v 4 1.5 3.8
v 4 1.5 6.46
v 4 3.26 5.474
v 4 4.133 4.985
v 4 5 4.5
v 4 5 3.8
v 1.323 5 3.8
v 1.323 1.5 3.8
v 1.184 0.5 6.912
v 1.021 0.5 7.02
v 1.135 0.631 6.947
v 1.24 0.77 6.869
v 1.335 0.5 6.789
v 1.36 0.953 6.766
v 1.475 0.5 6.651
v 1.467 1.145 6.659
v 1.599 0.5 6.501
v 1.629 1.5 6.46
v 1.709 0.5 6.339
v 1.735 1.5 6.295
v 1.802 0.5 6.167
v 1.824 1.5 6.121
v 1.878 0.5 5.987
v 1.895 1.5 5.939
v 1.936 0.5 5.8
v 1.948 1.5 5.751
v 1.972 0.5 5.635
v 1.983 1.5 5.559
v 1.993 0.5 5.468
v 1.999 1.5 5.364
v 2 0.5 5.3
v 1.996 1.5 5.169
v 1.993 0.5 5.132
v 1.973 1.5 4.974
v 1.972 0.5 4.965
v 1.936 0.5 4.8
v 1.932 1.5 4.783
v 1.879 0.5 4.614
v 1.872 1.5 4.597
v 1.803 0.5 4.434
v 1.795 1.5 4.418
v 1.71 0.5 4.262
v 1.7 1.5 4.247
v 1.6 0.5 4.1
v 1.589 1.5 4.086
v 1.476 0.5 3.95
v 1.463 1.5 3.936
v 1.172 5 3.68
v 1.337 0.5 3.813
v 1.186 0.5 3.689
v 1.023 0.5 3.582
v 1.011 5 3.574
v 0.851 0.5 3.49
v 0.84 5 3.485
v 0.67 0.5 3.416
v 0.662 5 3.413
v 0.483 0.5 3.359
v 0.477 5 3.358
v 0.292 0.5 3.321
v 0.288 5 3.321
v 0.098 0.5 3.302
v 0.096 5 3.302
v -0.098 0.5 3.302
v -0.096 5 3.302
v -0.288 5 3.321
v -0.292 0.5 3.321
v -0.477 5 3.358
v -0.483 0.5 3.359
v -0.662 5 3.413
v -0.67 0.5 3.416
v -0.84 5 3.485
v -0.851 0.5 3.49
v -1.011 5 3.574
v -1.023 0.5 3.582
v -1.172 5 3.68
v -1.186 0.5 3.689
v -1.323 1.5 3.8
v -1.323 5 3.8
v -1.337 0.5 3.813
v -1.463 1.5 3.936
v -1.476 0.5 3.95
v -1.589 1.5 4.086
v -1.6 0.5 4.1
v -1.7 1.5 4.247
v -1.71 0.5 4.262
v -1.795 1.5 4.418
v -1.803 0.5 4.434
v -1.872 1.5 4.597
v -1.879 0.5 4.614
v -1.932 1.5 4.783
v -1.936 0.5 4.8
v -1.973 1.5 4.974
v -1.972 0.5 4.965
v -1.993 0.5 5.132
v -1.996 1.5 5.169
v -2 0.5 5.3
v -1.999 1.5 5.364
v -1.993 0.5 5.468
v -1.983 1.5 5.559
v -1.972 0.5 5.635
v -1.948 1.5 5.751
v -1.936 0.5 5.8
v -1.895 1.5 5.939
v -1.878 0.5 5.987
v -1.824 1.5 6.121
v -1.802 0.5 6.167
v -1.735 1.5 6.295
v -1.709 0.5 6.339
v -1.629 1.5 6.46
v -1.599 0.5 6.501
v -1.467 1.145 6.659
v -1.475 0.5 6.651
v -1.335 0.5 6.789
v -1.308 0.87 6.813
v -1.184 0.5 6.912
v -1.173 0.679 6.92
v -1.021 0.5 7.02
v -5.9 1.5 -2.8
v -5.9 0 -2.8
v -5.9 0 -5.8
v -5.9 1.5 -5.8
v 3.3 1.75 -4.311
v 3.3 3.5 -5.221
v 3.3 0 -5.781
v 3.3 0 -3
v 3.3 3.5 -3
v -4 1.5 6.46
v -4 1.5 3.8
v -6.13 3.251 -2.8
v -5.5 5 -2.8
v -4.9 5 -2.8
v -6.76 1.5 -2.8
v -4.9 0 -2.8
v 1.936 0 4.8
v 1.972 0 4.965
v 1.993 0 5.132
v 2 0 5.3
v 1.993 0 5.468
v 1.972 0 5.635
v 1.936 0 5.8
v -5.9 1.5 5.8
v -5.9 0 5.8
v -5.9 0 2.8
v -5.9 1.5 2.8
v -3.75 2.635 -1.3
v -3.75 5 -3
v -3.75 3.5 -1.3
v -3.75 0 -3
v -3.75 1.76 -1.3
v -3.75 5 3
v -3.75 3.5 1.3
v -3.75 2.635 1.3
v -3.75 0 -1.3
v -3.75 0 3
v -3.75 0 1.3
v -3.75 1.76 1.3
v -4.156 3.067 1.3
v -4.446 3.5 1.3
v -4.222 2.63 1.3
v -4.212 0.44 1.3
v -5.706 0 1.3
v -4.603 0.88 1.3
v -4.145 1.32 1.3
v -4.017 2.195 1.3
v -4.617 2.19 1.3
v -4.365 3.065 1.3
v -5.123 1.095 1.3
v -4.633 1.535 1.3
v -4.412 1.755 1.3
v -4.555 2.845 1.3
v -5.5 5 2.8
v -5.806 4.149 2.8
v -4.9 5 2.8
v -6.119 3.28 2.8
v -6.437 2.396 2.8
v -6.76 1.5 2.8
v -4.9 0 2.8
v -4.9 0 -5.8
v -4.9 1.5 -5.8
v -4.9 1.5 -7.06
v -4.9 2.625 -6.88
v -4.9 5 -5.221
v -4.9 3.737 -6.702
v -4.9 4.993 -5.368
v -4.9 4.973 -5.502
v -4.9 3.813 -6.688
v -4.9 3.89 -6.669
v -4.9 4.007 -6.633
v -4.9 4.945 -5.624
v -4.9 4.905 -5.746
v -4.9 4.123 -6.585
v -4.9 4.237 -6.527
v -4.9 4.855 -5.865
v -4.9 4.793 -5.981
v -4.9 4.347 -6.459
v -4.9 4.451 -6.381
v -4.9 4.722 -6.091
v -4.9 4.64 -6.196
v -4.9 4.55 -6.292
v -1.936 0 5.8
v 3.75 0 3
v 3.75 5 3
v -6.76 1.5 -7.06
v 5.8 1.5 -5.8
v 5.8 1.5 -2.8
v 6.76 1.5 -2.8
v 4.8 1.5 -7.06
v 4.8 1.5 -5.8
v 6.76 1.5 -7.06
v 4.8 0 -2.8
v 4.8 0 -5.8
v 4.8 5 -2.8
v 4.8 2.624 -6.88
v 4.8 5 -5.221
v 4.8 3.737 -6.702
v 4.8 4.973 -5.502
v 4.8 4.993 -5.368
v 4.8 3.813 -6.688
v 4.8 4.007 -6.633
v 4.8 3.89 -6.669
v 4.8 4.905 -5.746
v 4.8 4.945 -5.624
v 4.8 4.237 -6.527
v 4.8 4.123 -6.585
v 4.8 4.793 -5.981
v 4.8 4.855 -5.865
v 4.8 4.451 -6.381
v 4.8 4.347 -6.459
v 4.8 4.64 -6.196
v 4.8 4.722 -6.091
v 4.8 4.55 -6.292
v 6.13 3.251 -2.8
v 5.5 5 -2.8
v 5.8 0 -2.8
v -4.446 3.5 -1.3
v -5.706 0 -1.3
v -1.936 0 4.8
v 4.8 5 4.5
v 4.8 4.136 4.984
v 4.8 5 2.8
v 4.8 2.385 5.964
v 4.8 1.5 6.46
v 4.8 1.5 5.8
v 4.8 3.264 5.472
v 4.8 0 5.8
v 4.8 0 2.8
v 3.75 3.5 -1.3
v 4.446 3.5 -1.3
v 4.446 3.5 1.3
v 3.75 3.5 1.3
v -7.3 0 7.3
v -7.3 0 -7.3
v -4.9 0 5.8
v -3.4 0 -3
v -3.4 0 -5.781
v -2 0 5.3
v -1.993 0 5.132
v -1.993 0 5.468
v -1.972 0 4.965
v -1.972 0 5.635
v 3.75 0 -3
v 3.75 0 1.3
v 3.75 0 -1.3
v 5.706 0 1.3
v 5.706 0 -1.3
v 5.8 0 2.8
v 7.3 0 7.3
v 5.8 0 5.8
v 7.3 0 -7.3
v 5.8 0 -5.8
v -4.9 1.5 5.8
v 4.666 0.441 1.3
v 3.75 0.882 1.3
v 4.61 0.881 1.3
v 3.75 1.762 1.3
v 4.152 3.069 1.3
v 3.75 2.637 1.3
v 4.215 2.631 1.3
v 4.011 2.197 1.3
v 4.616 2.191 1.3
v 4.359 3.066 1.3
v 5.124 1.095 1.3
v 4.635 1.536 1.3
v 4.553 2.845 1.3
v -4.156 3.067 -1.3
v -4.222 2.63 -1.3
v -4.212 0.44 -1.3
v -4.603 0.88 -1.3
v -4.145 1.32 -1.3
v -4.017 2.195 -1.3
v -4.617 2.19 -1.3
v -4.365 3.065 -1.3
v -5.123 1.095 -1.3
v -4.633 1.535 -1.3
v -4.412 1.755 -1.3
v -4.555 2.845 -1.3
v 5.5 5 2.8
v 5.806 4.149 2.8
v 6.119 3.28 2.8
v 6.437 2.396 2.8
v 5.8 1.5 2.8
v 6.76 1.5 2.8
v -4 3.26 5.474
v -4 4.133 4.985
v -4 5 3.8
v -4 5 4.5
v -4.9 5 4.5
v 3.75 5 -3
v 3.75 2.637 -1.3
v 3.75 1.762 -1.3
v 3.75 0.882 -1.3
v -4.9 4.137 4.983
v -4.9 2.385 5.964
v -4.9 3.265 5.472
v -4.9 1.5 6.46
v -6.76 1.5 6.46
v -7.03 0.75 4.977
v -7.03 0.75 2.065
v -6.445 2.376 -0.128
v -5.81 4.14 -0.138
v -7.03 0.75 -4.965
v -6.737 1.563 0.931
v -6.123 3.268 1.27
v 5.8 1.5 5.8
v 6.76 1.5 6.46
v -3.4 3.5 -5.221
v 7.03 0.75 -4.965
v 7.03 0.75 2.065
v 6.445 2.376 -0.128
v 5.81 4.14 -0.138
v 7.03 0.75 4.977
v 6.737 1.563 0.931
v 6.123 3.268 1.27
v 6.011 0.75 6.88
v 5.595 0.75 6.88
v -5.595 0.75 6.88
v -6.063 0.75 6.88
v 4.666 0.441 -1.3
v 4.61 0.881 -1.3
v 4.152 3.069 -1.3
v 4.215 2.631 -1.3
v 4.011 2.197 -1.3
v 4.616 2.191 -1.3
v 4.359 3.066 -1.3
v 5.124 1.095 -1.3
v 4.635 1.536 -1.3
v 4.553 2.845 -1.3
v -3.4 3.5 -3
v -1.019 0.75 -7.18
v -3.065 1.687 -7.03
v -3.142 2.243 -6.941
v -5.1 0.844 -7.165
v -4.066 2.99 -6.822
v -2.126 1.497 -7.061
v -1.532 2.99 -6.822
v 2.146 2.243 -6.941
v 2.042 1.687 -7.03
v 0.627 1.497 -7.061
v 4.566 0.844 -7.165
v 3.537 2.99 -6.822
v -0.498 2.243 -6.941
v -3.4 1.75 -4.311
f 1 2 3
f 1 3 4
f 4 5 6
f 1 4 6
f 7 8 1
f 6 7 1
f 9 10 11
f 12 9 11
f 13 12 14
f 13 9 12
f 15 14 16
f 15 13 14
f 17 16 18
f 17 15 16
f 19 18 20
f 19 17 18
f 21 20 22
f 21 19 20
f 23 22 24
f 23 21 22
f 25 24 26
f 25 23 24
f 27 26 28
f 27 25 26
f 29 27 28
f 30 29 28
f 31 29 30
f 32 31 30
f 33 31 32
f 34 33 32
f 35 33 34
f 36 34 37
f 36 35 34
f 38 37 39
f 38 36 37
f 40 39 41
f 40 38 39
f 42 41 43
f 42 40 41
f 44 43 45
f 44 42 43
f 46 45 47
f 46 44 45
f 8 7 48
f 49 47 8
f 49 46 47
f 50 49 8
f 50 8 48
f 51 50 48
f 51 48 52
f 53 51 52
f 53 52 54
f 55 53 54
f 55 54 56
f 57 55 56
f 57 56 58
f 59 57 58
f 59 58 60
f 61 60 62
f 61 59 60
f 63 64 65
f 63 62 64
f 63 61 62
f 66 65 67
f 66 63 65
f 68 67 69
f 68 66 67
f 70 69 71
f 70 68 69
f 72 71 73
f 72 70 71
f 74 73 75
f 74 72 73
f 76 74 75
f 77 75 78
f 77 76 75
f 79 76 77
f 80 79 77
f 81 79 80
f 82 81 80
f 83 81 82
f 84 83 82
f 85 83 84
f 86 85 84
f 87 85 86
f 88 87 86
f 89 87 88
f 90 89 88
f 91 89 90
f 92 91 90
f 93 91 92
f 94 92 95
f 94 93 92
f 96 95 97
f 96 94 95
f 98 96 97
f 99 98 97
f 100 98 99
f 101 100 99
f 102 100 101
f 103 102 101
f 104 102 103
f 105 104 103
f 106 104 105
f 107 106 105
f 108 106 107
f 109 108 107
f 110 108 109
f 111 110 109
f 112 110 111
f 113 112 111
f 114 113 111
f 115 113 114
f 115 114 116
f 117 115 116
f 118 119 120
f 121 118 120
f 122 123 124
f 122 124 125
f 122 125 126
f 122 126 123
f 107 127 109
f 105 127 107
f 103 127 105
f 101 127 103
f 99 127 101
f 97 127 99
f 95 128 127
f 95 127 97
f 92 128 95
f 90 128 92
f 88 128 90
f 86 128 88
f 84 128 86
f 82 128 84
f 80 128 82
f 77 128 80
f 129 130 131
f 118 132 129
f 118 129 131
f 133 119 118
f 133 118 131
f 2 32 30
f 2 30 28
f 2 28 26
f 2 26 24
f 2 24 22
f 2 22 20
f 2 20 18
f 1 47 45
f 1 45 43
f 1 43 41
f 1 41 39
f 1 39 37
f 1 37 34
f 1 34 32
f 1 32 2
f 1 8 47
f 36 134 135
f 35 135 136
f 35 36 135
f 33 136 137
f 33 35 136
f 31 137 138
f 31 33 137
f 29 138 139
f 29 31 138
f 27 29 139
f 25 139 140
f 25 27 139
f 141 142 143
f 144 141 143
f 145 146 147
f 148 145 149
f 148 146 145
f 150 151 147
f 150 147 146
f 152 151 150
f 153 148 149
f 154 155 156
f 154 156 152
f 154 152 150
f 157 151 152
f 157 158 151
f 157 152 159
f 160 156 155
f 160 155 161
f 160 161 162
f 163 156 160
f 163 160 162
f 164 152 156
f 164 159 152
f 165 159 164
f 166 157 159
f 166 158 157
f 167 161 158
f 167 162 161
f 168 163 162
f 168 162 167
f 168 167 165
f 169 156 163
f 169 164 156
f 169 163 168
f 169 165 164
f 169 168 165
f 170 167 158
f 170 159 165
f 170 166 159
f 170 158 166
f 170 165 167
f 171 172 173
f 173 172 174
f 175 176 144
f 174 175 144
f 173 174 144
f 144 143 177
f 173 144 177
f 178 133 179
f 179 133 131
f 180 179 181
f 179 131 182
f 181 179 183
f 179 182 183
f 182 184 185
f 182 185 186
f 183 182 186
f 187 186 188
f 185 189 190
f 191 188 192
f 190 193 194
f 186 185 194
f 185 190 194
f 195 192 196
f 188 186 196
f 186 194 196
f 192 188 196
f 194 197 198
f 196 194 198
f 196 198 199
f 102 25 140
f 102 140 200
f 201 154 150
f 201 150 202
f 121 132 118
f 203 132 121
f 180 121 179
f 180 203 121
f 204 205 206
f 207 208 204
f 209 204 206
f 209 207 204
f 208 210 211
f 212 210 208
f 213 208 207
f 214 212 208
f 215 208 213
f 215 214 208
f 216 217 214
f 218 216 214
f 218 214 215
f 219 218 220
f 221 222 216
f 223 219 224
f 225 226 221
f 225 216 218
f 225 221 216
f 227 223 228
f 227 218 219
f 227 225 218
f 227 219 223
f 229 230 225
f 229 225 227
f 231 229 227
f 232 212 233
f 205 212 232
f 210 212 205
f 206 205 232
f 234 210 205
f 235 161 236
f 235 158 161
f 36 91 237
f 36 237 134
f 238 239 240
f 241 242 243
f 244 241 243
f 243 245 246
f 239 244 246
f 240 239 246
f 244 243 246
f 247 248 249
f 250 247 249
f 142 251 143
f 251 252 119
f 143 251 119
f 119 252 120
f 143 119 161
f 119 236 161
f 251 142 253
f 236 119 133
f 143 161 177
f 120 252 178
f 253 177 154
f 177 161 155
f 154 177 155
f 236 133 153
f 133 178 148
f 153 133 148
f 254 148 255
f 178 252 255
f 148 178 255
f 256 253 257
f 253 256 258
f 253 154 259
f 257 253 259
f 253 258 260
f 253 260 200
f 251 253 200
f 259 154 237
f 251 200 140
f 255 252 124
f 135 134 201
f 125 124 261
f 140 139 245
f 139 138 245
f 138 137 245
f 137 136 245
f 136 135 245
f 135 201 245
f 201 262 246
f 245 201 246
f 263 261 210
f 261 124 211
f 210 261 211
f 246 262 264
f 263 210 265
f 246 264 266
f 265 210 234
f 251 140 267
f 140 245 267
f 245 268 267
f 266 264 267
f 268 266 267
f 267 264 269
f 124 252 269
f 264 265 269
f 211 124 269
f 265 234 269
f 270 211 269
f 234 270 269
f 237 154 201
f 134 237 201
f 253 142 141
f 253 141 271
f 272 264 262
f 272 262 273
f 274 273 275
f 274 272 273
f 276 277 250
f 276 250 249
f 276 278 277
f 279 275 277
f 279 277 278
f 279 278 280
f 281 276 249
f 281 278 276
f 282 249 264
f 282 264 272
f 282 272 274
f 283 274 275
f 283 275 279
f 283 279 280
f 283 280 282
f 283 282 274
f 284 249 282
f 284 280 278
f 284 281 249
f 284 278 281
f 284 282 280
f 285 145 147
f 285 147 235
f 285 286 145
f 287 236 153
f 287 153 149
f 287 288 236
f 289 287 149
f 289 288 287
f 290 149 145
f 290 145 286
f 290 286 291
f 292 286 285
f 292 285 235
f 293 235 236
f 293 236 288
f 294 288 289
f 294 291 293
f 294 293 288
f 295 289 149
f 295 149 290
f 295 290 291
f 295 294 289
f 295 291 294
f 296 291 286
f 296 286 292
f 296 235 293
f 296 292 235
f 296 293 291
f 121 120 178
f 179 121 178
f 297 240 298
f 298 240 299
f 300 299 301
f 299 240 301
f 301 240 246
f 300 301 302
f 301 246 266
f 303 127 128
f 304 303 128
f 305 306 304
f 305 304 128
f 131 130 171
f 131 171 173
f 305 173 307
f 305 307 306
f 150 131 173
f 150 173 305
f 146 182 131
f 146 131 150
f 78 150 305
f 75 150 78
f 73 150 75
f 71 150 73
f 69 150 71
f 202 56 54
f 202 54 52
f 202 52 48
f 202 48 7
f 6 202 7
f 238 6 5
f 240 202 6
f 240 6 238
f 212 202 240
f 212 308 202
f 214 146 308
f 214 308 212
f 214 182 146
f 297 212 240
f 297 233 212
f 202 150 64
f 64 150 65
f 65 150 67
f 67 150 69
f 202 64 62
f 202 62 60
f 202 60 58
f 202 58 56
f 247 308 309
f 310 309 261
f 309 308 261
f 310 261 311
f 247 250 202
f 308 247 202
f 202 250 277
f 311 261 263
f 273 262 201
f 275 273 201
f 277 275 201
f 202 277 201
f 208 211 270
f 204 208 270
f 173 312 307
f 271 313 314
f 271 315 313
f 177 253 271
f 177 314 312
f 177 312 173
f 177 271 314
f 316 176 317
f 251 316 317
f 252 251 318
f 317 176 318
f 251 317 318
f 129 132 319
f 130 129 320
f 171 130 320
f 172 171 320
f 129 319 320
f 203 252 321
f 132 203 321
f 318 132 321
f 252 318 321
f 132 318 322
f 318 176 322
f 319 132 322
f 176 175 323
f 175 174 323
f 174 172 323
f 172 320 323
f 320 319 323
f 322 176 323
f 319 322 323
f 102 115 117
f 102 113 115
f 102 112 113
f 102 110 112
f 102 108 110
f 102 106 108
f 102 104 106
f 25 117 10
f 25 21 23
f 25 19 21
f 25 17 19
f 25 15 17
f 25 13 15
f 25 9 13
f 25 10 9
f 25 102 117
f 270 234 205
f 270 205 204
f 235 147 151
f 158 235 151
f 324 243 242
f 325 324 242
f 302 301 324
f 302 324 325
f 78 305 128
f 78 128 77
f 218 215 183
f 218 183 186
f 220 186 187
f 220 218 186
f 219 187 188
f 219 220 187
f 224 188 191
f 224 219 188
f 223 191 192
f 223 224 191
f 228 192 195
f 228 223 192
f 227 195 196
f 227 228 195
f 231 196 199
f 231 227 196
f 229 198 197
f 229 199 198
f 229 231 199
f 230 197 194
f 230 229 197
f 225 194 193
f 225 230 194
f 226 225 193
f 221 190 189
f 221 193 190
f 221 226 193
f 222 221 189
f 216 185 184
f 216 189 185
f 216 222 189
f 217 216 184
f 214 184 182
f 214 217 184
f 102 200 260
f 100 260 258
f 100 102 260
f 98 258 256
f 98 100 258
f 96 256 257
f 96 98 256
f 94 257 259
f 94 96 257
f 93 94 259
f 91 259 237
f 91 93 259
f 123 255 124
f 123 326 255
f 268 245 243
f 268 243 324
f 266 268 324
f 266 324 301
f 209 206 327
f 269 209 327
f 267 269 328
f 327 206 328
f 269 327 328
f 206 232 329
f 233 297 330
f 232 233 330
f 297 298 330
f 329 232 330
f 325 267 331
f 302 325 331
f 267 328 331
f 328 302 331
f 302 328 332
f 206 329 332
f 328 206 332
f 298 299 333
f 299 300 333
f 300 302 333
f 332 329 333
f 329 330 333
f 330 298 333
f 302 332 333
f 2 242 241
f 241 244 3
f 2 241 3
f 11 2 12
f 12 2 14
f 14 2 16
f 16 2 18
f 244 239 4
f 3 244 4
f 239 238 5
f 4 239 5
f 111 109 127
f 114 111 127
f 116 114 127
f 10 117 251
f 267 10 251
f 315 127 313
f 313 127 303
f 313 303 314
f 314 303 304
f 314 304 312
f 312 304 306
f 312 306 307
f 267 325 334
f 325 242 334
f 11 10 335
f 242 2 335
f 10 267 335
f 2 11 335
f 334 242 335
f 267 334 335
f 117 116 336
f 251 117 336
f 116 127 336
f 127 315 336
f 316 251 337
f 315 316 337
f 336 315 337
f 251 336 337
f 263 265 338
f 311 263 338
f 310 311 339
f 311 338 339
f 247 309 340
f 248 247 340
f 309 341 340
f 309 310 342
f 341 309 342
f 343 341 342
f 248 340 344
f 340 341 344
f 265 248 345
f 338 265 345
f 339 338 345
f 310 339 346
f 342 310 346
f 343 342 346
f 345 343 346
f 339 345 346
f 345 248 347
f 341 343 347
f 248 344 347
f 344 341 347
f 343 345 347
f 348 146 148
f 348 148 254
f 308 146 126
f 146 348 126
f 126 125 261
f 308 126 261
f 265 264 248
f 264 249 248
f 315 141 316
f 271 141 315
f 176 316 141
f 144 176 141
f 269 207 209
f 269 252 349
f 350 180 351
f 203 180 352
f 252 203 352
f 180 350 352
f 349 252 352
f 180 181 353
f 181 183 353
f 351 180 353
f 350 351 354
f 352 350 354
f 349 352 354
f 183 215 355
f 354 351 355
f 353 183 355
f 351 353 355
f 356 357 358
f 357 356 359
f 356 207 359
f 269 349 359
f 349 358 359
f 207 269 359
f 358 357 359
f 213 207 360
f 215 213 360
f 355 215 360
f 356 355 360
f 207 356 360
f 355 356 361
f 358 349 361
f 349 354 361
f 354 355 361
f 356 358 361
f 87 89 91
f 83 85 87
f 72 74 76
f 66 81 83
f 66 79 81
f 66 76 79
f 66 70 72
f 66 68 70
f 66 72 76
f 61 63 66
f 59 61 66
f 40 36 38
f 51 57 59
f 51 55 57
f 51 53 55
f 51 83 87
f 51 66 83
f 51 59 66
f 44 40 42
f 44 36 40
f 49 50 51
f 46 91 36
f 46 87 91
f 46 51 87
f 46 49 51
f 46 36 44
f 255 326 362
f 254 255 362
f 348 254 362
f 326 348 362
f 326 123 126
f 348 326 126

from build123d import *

# Parameters (mm, degrees)
FILLET1_R               = 1.5
SKETCH4_W               = 2.4
SKETCH4_H               = 4.5
SKETCH4_W_2             = 2.5
SKETCH4_W_3             = 8
SKETCH4_H_2             = 3.5
CUT_EXTRUDE1_DEPTH      = 3.5
SKETCH3_W               = 7.5
SKETCH3_H               = 6
CUT_EXTRUDE2_DEPTH      = 12.470832747
CUT_EXTRUDE5_DEPTH      = 11.900917559
CUT_EXTRUDE5_DEPTH_BACK = 1
SKETCH5_R               = 2
CUT_EXTRUDE6_START      = -0.5
CUT_EXTRUDE6_DEPTH      = 1.5
SKETCH9_W               = 1
SKETCH9_H               = 3
CUT_EXTRUDE9_DEPTH      = 12.470832747


with BuildPart() as part:
    # Sketch1 → Loft1 section 0
    with BuildSketch(Plane(origin=(0, 0, 0), x_dir=(1, 0, 0), z_dir=(0, 1, 0))):
        with BuildLine():
            Line((-7.3, 7.3), (7.3, 7.3))
            Line((7.3, 7.3), (7.3, -7.3))
            Line((7.3, -7.3), (-7.3, -7.3))
            Line((-7.3, -7.3), (-7.3, 7.3))
        make_face()
    # Sketch2 → Loft1 section 1
    with BuildSketch(Plane(origin=(0, 5, 0), x_dir=(1, 0, 0), z_dir=(0, 1, 0))):
        with BuildLine():
            Line((-5.5, 6.5), (5.5, 6.5))
            Line((5.5, 6.5), (5.5, -4.5))
            Line((5.5, -4.5), (-5.5, -4.5))
            Line((-5.5, -4.5), (-5.5, 6.5))
        make_face()
    loft()

    # Fillet1
    fillet1_edges = [part.edges().sort_by_distance(p)[0] for p in [
        (0, 5, -6.5),
    ]]
    fillet(fillet1_edges, radius=FILLET1_R)

    # Sketch4 → Cut-Extrude1 (cut)
    with BuildSketch(Plane(origin=(0, 5, 0), x_dir=(1, 0, 0), z_dir=(0, 1, 0))):
        with Locations((-6.1, -5.05)):
            Rectangle(SKETCH4_W, SKETCH4_H)
        with Locations((6.05, 5.05)):
            Rectangle(SKETCH4_W_2, SKETCH4_H)
        with Locations((-6.1, 5.05)):
            Rectangle(SKETCH4_W, SKETCH4_H)
        with Locations((6.05, -5.05)):
            Rectangle(SKETCH4_W_2, SKETCH4_H)
        with Locations((0, -5.55)):
            Rectangle(SKETCH4_W_3, SKETCH4_H_2)
    extrude(amount=-CUT_EXTRUDE1_DEPTH, mode=Mode.SUBTRACT)

    # Shell2: read off the stored shape, not the designer's step
    # Shell2: loft between two sections, ruled curve by curve
    shell2_from = [
        Edge.make_line((5.705760369, 0, 1.3), (5.705760369, 0, -1.3)),
        Edge.make_line((-3.4, 0, -5.780921332), (3.3, 0, -5.780921332)),
        Edge.make_line((-5.705760369, 0, 1.3), (-5.705760369, 0, -1.3)),
        Edge.make_line((5.705760369, 0, -1.3), (3.3, 0, -1.3)),
        Edge.make_line((-5.705760369, 0, -1.3), (-3.4, 0, -1.3)),
        Edge.make_line((3.3, 0, -5.780921332), (3.3, 0, -1.3)),
        Edge.make_line((3.3, 0, 1.3), (3.3, 0, 2.3)),
        Edge.make_line((-3.4, 0, -5.780921332), (-3.4, 0, -1.3)),
        Edge.make_line((-3.4, 0, 2.3), (-3.4, 0, 1.3)),
        Edge.make_line((-3.4, 0, 1.3), (-5.705760369, 0, 1.3)),
        Edge.make_line((5.705760369, 0, 1.3), (3.3, 0, 1.3)),
        Edge.make_line((3.3, 0, 2.3), (-3.4, 0, 2.3)),
    ]
    shell2_to = [
        Edge.make_line((4.445760369, 3.5, 1.3), (4.445760369, 3.5, -1.3)),
        Edge.make_line((-3.4, 3.5, -5.220921332), (3.3, 3.5, -5.220921332)),
        Edge.make_line((-4.445760369, 3.5, 1.3), (-4.445760369, 3.5, -1.3)),
        Edge.make_line((4.445760369, 3.5, -1.3), (3.3, 3.5, -1.3)),
        Edge.make_line((-4.445760369, 3.5, -1.3), (-3.4, 3.5, -1.3)),
        Edge.make_line((3.3, 3.5, -5.220921332), (3.3, 3.5, -1.3)),
        Edge.make_line((3.3, 3.5, 1.3), (3.3, 3.5, 2.3)),
        Edge.make_line((-3.4, 3.5, -5.220921332), (-3.4, 3.5, -1.3)),
        Edge.make_line((-3.4, 3.5, 2.3), (-3.4, 3.5, 1.3)),
        Edge.make_line((-3.4, 3.5, 1.3), (-4.445760369, 3.5, 1.3)),
        Edge.make_line((4.445760369, 3.5, 1.3), (3.3, 3.5, 1.3)),
        Edge.make_line((3.3, 3.5, 2.3), (-3.4, 3.5, 2.3)),
    ]
    shell2 = Solid(Shell([*[Face.make_surface_from_curves(shell2_from[k], shell2_to[k]) for k in range(12)], Face(Wire(shell2_from)), Face(Wire(shell2_to))]))
    add(shell2, mode=Mode.SUBTRACT)

    # Sketch3 → Cut-Extrude2 (cut, through all)
    with BuildSketch(Plane.XZ):
        Rectangle(SKETCH3_W, SKETCH3_H)
    extrude(amount=-CUT_EXTRUDE2_DEPTH, mode=Mode.SUBTRACT)

    # Sketch5 → Cut-Extrude5 (cut, two sides: drawn at the far end of the back side and taken through both)
    with BuildSketch(Plane(origin=(0, 1.5, 0), x_dir=(1, 0, 0), z_dir=(0, 1, 0)).offset(-CUT_EXTRUDE5_DEPTH_BACK)):
        with Locations((0, -5.3)):
            Circle(SKETCH5_R)
    extrude(amount=CUT_EXTRUDE5_DEPTH + CUT_EXTRUDE5_DEPTH_BACK, mode=Mode.SUBTRACT)

    # Cut-Extrude6: read off the stored shape, not the designer's step
    # Cut-Extrude6 outline → Cut-Extrude6 (cut)
    with BuildSketch(Plane.XZ.offset(CUT_EXTRUDE6_START)):
        with BuildLine():
            Line((1.936491673, 5.8), (-1.936491673, 5.8))
            ThreePointArc((-1.936491673, 5.8), (-2, 5.3), (-1.936491673, 4.8))
            Line((-1.936491673, 4.8), (1.936491673, 4.8))
            ThreePointArc((1.936491673, 4.8), (2, 5.3), (1.936491673, 5.8))
        make_face()
    extrude(amount=CUT_EXTRUDE6_DEPTH, mode=Mode.SUBTRACT)

    # Sketch9 → Cut-Extrude9 (cut, through all)
    with BuildSketch(Plane(origin=(0, 0, 0), x_dir=(1, 0, 0), z_dir=(0, 1, 0))):
        with Locations((-5.4, 4.3)):
            Rectangle(SKETCH9_W, SKETCH9_H)
        with Locations((5.3, 4.3)):
            Rectangle(SKETCH9_W, SKETCH9_H)
        with Locations((-5.4, -4.3)):
            Rectangle(SKETCH9_W, SKETCH9_H)
        with Locations((5.3, -4.3)):
            Rectangle(SKETCH9_W, SKETCH9_H)
    extrude(amount=CUT_EXTRUDE9_DEPTH, mode=Mode.SUBTRACT)


solid = part.part
